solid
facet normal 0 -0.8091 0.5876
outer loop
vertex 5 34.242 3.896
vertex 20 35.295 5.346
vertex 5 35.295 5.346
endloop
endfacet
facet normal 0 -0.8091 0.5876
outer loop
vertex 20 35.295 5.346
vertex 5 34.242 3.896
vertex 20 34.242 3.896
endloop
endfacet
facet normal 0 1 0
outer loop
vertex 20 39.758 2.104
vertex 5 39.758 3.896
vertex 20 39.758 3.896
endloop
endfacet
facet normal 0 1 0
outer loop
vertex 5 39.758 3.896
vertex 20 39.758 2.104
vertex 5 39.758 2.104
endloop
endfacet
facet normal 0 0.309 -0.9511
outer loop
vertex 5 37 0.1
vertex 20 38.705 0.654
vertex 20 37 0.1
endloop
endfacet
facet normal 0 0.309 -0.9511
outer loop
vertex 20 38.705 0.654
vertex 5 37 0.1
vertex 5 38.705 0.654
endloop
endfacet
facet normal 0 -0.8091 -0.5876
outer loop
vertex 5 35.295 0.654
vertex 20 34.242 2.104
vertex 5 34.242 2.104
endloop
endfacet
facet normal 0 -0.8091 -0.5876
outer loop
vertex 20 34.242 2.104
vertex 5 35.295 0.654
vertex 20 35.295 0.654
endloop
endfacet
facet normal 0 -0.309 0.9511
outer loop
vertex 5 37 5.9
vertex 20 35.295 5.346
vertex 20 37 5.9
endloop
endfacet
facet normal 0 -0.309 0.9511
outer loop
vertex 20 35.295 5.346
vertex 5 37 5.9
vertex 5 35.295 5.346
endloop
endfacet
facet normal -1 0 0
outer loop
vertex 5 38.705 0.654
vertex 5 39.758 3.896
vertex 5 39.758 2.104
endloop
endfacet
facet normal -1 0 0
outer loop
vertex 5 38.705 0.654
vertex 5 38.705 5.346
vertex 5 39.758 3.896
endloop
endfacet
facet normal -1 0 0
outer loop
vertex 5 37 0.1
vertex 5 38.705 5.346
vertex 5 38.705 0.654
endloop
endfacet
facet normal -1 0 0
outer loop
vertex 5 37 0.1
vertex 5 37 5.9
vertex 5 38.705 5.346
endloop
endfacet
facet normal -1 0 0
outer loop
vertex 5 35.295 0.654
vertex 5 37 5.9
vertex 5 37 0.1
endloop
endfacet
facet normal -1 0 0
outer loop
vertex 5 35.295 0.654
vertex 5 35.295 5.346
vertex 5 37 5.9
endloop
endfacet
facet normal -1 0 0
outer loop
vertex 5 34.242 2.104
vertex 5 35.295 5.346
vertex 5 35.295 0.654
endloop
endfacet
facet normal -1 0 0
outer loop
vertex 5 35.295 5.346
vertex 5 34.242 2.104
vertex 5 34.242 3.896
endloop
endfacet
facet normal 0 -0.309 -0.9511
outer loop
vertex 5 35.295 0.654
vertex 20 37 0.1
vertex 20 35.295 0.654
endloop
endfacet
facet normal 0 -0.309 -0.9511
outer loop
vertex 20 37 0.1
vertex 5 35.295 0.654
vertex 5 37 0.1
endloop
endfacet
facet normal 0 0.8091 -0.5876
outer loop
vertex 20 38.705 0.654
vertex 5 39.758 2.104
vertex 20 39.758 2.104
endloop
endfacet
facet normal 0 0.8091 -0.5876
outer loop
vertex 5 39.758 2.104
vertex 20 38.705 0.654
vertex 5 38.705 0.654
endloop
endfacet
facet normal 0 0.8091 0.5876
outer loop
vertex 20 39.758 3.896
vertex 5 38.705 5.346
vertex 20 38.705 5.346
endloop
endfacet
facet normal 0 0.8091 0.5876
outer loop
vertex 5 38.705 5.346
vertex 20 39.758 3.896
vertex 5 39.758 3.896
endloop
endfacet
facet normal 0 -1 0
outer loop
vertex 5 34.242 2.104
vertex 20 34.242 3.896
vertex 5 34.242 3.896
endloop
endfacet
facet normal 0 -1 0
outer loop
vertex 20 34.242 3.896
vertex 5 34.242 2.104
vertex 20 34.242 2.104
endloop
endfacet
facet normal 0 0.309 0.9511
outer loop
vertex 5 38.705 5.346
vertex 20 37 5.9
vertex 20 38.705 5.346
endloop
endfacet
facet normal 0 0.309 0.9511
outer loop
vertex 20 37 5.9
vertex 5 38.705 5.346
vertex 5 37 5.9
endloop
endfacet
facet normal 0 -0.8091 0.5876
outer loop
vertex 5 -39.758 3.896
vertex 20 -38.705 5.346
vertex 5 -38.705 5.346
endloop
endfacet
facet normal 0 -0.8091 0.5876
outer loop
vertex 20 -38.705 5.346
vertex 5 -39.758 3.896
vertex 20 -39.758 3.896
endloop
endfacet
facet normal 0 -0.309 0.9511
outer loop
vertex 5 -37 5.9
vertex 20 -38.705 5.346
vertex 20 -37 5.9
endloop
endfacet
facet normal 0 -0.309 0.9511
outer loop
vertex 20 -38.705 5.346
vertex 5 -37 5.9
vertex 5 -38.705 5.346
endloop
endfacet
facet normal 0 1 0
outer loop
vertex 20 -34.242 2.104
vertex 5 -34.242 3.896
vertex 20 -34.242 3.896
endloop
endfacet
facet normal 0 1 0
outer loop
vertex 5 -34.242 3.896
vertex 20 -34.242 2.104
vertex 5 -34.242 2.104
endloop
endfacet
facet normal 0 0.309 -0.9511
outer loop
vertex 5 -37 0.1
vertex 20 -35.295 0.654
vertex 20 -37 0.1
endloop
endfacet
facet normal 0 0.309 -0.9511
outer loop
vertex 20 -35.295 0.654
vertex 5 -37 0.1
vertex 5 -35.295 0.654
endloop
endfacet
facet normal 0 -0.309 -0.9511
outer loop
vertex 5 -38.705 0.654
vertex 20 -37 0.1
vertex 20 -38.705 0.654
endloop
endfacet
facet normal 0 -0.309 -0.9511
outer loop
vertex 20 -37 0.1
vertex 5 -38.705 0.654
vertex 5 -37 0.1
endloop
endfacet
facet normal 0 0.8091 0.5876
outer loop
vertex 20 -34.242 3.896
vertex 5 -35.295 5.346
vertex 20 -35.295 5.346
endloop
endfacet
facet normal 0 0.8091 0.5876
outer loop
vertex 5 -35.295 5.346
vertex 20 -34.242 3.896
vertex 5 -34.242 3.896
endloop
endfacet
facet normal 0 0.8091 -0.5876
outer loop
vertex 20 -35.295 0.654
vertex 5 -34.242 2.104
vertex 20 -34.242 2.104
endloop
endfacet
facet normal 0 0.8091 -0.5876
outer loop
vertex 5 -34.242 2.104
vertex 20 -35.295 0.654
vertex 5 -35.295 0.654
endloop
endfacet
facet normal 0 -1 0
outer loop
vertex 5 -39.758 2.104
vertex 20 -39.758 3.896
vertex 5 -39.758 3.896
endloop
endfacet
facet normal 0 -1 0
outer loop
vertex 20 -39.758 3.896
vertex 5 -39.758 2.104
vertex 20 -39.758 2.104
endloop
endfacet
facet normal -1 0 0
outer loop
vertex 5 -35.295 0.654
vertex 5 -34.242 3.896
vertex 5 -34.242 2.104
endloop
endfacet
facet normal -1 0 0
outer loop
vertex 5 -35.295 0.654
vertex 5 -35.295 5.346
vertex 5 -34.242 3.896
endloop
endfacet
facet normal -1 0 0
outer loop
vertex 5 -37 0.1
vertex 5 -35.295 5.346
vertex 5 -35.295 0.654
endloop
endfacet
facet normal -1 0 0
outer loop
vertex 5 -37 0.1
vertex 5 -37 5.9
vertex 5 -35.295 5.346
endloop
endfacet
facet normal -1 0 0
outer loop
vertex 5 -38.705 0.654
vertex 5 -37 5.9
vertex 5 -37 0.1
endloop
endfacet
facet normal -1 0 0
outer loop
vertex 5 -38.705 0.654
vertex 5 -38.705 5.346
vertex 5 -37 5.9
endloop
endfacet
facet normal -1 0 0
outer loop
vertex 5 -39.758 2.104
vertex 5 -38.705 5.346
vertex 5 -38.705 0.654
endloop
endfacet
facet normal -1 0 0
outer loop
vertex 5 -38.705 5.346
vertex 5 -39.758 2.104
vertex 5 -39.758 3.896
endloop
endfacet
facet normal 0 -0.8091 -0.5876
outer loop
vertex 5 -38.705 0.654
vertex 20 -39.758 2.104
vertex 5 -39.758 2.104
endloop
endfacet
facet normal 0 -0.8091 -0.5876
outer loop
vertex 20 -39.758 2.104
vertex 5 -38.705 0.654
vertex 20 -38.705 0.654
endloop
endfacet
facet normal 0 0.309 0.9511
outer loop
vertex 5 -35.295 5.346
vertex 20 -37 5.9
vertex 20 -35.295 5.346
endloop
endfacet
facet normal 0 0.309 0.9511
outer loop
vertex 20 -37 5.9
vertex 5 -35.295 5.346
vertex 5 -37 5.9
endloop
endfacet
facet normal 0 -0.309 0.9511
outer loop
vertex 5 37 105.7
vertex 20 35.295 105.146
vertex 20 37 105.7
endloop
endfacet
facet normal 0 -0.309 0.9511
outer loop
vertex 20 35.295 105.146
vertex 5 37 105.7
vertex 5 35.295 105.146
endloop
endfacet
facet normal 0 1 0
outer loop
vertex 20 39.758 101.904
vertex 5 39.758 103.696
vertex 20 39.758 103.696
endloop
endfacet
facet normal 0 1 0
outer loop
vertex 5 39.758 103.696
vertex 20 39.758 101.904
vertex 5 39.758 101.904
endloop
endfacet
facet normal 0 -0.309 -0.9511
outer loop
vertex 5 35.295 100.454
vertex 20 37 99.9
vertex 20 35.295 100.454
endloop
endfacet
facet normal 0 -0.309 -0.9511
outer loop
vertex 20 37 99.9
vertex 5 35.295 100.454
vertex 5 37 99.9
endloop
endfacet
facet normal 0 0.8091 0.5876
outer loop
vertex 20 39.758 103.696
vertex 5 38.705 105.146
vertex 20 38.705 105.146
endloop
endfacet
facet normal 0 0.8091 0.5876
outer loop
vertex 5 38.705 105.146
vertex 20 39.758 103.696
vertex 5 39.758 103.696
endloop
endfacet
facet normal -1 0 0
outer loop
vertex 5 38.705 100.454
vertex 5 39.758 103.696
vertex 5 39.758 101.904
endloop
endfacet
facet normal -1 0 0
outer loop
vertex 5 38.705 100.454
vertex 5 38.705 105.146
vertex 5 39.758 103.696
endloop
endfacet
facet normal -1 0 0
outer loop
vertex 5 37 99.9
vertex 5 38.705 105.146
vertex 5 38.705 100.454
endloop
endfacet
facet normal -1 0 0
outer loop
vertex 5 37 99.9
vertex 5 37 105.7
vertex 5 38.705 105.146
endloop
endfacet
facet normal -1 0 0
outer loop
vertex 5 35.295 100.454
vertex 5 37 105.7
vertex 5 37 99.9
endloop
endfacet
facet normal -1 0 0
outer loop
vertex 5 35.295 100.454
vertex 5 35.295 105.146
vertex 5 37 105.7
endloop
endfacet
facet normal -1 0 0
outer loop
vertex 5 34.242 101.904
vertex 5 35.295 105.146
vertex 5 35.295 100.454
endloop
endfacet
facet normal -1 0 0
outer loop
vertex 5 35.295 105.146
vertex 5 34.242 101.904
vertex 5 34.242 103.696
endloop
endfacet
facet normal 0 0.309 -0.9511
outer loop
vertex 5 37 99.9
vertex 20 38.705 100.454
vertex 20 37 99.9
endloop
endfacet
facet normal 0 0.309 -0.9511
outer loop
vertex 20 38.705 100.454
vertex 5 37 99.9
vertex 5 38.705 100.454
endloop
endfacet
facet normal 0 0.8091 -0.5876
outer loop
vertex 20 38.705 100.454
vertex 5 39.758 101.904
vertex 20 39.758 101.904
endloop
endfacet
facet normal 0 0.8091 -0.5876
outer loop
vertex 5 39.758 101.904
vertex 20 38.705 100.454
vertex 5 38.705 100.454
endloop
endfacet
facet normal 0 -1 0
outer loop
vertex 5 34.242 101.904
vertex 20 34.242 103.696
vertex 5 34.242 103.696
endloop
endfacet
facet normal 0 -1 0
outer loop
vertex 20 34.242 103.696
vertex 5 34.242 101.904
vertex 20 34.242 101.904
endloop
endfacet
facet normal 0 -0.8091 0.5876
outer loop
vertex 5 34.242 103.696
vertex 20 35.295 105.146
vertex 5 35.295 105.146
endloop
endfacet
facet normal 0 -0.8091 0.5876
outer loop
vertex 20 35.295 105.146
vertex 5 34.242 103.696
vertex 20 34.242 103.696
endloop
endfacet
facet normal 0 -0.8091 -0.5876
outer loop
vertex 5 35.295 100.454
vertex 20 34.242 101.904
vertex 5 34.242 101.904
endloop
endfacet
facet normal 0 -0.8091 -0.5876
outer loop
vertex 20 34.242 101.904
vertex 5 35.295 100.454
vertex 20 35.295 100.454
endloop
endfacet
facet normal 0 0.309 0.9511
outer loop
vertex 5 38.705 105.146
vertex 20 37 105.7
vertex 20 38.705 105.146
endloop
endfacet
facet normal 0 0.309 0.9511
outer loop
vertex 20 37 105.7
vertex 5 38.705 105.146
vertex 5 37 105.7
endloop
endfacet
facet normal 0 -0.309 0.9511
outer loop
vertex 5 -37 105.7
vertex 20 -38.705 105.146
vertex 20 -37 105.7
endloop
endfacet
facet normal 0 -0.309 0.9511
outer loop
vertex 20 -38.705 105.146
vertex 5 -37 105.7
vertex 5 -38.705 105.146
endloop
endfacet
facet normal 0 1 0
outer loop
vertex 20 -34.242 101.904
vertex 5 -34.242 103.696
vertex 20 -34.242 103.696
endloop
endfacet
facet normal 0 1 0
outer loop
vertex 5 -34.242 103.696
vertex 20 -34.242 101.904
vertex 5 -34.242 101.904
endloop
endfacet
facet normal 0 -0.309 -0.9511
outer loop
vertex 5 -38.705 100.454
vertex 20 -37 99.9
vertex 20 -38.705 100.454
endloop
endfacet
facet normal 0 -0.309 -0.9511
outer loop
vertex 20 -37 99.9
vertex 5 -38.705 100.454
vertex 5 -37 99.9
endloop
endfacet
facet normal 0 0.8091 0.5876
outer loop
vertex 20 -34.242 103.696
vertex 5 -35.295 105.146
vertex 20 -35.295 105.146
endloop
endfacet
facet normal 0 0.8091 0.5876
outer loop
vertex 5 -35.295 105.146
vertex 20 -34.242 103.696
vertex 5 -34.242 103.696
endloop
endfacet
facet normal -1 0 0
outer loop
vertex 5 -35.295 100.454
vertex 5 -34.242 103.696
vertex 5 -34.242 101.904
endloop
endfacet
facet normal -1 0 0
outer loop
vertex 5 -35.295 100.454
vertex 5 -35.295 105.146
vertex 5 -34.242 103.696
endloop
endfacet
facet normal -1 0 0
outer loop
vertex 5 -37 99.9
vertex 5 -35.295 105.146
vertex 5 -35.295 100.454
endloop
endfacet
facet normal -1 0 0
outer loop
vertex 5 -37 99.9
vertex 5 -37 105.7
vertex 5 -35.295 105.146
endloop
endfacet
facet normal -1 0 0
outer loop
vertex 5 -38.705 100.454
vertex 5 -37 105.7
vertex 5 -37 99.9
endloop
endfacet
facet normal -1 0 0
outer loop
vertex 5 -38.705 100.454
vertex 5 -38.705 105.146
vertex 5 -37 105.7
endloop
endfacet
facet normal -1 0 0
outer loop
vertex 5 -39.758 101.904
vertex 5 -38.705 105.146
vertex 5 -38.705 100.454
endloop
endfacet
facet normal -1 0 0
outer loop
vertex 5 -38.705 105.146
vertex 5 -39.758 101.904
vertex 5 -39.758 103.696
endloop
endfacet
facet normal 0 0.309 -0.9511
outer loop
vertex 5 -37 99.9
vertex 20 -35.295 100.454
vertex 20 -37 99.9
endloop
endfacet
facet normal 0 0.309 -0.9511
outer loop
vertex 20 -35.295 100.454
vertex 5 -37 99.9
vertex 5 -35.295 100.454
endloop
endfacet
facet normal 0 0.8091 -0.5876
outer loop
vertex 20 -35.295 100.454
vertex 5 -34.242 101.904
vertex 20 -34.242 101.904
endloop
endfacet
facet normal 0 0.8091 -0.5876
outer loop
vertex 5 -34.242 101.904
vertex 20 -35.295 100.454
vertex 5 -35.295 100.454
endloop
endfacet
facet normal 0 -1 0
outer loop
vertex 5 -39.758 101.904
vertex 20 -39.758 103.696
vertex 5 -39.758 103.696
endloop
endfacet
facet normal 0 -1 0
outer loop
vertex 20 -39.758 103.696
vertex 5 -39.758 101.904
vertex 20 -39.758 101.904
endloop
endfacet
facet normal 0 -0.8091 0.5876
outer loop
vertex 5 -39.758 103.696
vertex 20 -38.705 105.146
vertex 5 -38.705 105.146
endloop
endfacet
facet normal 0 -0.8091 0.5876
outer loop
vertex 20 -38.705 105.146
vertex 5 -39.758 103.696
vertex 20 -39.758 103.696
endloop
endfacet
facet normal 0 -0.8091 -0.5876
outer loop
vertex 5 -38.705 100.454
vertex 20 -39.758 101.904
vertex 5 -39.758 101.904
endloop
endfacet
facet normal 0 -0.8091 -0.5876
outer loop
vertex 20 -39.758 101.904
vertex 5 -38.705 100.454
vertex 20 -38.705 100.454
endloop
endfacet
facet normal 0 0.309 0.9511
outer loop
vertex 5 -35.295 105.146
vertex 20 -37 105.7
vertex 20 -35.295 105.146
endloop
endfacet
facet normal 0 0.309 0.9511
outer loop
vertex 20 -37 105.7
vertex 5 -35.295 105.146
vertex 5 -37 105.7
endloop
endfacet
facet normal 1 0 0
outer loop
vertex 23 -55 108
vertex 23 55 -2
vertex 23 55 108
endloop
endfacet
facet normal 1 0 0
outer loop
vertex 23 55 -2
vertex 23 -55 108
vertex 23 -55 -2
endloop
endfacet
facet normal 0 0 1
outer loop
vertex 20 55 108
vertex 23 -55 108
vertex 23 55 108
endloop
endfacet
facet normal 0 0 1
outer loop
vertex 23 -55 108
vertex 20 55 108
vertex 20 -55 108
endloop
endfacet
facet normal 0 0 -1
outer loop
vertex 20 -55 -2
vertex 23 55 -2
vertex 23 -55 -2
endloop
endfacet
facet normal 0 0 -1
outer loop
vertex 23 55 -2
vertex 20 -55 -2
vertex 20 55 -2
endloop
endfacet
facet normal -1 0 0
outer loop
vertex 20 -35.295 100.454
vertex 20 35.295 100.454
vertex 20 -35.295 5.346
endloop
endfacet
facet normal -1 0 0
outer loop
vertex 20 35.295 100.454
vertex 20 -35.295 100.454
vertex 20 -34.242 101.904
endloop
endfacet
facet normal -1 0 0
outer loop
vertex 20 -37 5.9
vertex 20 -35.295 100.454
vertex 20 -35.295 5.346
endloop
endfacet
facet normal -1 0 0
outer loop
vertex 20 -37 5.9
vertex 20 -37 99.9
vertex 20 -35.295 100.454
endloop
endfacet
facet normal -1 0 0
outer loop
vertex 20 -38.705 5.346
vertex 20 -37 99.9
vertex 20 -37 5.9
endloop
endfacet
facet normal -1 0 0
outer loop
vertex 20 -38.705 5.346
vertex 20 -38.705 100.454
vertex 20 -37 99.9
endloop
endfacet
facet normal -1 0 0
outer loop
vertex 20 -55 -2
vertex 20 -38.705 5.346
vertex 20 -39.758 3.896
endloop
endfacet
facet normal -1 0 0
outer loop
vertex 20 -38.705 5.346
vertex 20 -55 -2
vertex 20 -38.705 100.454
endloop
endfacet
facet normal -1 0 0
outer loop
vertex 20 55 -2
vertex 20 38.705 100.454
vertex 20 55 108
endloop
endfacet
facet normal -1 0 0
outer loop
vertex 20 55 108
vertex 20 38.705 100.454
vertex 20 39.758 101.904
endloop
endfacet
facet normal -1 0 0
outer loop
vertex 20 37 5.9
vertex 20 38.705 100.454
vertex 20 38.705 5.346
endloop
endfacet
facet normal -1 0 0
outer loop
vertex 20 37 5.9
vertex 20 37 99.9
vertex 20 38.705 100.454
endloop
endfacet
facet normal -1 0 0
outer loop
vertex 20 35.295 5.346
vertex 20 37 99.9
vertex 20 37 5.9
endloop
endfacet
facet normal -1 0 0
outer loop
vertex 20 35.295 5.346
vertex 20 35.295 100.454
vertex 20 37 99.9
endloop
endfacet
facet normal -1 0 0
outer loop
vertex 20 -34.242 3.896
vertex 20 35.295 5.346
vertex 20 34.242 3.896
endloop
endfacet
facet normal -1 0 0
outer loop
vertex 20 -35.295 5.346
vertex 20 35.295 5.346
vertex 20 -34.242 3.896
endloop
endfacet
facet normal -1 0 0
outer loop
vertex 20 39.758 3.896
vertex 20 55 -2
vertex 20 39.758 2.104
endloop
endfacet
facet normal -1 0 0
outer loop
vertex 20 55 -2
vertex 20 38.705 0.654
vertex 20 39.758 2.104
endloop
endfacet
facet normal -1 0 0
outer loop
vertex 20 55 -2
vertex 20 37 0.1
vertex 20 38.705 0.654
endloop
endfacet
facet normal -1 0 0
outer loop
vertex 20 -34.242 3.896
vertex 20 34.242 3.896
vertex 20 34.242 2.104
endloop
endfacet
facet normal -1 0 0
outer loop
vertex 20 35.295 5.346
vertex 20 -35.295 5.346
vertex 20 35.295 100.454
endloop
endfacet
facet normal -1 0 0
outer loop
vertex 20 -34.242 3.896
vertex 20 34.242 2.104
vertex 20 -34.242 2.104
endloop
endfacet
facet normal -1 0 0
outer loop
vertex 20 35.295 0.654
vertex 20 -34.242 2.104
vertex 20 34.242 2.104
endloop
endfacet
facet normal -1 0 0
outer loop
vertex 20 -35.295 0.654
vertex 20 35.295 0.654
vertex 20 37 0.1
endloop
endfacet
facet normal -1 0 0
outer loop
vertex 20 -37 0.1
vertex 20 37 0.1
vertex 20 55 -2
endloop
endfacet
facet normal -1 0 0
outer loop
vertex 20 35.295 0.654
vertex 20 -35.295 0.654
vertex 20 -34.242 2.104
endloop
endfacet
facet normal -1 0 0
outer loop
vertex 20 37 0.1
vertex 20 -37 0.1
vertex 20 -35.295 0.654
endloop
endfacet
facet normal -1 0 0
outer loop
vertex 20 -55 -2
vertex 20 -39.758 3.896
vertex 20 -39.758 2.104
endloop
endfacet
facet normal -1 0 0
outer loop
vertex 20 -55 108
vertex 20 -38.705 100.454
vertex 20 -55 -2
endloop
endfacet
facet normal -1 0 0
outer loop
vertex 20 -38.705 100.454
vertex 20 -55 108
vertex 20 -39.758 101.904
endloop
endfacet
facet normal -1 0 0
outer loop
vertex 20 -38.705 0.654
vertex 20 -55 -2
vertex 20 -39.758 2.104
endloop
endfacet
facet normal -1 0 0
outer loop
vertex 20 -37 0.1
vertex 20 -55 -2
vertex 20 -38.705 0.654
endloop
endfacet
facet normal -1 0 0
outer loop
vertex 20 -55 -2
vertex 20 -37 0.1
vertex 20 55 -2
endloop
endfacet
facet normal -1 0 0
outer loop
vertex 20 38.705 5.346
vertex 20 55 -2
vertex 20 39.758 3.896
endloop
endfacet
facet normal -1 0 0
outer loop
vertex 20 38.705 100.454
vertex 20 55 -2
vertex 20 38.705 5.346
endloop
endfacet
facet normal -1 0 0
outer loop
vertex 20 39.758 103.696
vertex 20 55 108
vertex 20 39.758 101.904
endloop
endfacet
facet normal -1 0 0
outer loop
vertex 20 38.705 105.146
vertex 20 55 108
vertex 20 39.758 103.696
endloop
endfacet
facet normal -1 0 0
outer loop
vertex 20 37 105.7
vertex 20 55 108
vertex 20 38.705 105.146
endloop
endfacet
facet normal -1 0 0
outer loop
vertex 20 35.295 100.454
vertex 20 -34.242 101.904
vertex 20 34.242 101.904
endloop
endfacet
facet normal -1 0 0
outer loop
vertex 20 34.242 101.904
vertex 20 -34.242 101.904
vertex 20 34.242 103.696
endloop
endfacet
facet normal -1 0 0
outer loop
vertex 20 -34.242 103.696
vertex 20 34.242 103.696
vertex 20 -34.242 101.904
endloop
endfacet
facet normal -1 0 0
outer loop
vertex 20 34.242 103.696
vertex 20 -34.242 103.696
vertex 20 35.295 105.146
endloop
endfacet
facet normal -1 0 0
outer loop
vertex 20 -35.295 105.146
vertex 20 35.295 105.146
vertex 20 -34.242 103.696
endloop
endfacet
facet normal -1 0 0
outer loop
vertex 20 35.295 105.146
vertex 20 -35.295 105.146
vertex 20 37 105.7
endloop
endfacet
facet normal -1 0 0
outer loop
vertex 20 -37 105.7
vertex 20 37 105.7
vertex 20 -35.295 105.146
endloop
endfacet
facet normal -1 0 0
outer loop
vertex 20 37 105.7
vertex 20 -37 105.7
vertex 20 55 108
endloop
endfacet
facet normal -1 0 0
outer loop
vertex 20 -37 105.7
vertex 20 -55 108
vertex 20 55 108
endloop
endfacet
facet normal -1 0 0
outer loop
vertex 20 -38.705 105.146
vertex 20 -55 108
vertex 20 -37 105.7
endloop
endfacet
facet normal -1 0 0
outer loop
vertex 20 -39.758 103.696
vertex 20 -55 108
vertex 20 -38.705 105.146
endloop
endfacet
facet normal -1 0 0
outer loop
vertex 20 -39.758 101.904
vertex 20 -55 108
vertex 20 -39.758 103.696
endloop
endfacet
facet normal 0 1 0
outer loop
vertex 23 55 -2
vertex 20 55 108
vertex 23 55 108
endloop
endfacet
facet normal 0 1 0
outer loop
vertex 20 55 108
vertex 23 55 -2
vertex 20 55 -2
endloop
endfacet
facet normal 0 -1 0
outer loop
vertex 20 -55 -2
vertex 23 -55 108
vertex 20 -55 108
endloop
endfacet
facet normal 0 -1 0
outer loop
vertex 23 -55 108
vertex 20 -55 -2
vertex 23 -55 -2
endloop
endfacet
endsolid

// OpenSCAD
module cyl(y,z){
  translate([5,y,z]){
    rotate([0,90,0]){
      cylinder(h=16,r=2.9);
    }
  }
}


module four_cyl(h,w,z){
  cyl(w,z+0);
  cyl(-w,z+0);
  cyl(w,z+h);
  cyl(-w,z+h);
}

four_cyl(94+5.8,37,3);

translate([20,-55,-2]){
  cube([3,110,110]);
}

/*
difference(){
  translate([-67.29*0.707,0,0]) {
    cylinder(h=100, r=70.29);
  }
  translate([-67.29*0.707,0,-5]) {
    cylinder(h=110, r=67.29);
  }
  translate([-150,-75,-1]) {
    cube([150,150,150]);
  }
}
*/
